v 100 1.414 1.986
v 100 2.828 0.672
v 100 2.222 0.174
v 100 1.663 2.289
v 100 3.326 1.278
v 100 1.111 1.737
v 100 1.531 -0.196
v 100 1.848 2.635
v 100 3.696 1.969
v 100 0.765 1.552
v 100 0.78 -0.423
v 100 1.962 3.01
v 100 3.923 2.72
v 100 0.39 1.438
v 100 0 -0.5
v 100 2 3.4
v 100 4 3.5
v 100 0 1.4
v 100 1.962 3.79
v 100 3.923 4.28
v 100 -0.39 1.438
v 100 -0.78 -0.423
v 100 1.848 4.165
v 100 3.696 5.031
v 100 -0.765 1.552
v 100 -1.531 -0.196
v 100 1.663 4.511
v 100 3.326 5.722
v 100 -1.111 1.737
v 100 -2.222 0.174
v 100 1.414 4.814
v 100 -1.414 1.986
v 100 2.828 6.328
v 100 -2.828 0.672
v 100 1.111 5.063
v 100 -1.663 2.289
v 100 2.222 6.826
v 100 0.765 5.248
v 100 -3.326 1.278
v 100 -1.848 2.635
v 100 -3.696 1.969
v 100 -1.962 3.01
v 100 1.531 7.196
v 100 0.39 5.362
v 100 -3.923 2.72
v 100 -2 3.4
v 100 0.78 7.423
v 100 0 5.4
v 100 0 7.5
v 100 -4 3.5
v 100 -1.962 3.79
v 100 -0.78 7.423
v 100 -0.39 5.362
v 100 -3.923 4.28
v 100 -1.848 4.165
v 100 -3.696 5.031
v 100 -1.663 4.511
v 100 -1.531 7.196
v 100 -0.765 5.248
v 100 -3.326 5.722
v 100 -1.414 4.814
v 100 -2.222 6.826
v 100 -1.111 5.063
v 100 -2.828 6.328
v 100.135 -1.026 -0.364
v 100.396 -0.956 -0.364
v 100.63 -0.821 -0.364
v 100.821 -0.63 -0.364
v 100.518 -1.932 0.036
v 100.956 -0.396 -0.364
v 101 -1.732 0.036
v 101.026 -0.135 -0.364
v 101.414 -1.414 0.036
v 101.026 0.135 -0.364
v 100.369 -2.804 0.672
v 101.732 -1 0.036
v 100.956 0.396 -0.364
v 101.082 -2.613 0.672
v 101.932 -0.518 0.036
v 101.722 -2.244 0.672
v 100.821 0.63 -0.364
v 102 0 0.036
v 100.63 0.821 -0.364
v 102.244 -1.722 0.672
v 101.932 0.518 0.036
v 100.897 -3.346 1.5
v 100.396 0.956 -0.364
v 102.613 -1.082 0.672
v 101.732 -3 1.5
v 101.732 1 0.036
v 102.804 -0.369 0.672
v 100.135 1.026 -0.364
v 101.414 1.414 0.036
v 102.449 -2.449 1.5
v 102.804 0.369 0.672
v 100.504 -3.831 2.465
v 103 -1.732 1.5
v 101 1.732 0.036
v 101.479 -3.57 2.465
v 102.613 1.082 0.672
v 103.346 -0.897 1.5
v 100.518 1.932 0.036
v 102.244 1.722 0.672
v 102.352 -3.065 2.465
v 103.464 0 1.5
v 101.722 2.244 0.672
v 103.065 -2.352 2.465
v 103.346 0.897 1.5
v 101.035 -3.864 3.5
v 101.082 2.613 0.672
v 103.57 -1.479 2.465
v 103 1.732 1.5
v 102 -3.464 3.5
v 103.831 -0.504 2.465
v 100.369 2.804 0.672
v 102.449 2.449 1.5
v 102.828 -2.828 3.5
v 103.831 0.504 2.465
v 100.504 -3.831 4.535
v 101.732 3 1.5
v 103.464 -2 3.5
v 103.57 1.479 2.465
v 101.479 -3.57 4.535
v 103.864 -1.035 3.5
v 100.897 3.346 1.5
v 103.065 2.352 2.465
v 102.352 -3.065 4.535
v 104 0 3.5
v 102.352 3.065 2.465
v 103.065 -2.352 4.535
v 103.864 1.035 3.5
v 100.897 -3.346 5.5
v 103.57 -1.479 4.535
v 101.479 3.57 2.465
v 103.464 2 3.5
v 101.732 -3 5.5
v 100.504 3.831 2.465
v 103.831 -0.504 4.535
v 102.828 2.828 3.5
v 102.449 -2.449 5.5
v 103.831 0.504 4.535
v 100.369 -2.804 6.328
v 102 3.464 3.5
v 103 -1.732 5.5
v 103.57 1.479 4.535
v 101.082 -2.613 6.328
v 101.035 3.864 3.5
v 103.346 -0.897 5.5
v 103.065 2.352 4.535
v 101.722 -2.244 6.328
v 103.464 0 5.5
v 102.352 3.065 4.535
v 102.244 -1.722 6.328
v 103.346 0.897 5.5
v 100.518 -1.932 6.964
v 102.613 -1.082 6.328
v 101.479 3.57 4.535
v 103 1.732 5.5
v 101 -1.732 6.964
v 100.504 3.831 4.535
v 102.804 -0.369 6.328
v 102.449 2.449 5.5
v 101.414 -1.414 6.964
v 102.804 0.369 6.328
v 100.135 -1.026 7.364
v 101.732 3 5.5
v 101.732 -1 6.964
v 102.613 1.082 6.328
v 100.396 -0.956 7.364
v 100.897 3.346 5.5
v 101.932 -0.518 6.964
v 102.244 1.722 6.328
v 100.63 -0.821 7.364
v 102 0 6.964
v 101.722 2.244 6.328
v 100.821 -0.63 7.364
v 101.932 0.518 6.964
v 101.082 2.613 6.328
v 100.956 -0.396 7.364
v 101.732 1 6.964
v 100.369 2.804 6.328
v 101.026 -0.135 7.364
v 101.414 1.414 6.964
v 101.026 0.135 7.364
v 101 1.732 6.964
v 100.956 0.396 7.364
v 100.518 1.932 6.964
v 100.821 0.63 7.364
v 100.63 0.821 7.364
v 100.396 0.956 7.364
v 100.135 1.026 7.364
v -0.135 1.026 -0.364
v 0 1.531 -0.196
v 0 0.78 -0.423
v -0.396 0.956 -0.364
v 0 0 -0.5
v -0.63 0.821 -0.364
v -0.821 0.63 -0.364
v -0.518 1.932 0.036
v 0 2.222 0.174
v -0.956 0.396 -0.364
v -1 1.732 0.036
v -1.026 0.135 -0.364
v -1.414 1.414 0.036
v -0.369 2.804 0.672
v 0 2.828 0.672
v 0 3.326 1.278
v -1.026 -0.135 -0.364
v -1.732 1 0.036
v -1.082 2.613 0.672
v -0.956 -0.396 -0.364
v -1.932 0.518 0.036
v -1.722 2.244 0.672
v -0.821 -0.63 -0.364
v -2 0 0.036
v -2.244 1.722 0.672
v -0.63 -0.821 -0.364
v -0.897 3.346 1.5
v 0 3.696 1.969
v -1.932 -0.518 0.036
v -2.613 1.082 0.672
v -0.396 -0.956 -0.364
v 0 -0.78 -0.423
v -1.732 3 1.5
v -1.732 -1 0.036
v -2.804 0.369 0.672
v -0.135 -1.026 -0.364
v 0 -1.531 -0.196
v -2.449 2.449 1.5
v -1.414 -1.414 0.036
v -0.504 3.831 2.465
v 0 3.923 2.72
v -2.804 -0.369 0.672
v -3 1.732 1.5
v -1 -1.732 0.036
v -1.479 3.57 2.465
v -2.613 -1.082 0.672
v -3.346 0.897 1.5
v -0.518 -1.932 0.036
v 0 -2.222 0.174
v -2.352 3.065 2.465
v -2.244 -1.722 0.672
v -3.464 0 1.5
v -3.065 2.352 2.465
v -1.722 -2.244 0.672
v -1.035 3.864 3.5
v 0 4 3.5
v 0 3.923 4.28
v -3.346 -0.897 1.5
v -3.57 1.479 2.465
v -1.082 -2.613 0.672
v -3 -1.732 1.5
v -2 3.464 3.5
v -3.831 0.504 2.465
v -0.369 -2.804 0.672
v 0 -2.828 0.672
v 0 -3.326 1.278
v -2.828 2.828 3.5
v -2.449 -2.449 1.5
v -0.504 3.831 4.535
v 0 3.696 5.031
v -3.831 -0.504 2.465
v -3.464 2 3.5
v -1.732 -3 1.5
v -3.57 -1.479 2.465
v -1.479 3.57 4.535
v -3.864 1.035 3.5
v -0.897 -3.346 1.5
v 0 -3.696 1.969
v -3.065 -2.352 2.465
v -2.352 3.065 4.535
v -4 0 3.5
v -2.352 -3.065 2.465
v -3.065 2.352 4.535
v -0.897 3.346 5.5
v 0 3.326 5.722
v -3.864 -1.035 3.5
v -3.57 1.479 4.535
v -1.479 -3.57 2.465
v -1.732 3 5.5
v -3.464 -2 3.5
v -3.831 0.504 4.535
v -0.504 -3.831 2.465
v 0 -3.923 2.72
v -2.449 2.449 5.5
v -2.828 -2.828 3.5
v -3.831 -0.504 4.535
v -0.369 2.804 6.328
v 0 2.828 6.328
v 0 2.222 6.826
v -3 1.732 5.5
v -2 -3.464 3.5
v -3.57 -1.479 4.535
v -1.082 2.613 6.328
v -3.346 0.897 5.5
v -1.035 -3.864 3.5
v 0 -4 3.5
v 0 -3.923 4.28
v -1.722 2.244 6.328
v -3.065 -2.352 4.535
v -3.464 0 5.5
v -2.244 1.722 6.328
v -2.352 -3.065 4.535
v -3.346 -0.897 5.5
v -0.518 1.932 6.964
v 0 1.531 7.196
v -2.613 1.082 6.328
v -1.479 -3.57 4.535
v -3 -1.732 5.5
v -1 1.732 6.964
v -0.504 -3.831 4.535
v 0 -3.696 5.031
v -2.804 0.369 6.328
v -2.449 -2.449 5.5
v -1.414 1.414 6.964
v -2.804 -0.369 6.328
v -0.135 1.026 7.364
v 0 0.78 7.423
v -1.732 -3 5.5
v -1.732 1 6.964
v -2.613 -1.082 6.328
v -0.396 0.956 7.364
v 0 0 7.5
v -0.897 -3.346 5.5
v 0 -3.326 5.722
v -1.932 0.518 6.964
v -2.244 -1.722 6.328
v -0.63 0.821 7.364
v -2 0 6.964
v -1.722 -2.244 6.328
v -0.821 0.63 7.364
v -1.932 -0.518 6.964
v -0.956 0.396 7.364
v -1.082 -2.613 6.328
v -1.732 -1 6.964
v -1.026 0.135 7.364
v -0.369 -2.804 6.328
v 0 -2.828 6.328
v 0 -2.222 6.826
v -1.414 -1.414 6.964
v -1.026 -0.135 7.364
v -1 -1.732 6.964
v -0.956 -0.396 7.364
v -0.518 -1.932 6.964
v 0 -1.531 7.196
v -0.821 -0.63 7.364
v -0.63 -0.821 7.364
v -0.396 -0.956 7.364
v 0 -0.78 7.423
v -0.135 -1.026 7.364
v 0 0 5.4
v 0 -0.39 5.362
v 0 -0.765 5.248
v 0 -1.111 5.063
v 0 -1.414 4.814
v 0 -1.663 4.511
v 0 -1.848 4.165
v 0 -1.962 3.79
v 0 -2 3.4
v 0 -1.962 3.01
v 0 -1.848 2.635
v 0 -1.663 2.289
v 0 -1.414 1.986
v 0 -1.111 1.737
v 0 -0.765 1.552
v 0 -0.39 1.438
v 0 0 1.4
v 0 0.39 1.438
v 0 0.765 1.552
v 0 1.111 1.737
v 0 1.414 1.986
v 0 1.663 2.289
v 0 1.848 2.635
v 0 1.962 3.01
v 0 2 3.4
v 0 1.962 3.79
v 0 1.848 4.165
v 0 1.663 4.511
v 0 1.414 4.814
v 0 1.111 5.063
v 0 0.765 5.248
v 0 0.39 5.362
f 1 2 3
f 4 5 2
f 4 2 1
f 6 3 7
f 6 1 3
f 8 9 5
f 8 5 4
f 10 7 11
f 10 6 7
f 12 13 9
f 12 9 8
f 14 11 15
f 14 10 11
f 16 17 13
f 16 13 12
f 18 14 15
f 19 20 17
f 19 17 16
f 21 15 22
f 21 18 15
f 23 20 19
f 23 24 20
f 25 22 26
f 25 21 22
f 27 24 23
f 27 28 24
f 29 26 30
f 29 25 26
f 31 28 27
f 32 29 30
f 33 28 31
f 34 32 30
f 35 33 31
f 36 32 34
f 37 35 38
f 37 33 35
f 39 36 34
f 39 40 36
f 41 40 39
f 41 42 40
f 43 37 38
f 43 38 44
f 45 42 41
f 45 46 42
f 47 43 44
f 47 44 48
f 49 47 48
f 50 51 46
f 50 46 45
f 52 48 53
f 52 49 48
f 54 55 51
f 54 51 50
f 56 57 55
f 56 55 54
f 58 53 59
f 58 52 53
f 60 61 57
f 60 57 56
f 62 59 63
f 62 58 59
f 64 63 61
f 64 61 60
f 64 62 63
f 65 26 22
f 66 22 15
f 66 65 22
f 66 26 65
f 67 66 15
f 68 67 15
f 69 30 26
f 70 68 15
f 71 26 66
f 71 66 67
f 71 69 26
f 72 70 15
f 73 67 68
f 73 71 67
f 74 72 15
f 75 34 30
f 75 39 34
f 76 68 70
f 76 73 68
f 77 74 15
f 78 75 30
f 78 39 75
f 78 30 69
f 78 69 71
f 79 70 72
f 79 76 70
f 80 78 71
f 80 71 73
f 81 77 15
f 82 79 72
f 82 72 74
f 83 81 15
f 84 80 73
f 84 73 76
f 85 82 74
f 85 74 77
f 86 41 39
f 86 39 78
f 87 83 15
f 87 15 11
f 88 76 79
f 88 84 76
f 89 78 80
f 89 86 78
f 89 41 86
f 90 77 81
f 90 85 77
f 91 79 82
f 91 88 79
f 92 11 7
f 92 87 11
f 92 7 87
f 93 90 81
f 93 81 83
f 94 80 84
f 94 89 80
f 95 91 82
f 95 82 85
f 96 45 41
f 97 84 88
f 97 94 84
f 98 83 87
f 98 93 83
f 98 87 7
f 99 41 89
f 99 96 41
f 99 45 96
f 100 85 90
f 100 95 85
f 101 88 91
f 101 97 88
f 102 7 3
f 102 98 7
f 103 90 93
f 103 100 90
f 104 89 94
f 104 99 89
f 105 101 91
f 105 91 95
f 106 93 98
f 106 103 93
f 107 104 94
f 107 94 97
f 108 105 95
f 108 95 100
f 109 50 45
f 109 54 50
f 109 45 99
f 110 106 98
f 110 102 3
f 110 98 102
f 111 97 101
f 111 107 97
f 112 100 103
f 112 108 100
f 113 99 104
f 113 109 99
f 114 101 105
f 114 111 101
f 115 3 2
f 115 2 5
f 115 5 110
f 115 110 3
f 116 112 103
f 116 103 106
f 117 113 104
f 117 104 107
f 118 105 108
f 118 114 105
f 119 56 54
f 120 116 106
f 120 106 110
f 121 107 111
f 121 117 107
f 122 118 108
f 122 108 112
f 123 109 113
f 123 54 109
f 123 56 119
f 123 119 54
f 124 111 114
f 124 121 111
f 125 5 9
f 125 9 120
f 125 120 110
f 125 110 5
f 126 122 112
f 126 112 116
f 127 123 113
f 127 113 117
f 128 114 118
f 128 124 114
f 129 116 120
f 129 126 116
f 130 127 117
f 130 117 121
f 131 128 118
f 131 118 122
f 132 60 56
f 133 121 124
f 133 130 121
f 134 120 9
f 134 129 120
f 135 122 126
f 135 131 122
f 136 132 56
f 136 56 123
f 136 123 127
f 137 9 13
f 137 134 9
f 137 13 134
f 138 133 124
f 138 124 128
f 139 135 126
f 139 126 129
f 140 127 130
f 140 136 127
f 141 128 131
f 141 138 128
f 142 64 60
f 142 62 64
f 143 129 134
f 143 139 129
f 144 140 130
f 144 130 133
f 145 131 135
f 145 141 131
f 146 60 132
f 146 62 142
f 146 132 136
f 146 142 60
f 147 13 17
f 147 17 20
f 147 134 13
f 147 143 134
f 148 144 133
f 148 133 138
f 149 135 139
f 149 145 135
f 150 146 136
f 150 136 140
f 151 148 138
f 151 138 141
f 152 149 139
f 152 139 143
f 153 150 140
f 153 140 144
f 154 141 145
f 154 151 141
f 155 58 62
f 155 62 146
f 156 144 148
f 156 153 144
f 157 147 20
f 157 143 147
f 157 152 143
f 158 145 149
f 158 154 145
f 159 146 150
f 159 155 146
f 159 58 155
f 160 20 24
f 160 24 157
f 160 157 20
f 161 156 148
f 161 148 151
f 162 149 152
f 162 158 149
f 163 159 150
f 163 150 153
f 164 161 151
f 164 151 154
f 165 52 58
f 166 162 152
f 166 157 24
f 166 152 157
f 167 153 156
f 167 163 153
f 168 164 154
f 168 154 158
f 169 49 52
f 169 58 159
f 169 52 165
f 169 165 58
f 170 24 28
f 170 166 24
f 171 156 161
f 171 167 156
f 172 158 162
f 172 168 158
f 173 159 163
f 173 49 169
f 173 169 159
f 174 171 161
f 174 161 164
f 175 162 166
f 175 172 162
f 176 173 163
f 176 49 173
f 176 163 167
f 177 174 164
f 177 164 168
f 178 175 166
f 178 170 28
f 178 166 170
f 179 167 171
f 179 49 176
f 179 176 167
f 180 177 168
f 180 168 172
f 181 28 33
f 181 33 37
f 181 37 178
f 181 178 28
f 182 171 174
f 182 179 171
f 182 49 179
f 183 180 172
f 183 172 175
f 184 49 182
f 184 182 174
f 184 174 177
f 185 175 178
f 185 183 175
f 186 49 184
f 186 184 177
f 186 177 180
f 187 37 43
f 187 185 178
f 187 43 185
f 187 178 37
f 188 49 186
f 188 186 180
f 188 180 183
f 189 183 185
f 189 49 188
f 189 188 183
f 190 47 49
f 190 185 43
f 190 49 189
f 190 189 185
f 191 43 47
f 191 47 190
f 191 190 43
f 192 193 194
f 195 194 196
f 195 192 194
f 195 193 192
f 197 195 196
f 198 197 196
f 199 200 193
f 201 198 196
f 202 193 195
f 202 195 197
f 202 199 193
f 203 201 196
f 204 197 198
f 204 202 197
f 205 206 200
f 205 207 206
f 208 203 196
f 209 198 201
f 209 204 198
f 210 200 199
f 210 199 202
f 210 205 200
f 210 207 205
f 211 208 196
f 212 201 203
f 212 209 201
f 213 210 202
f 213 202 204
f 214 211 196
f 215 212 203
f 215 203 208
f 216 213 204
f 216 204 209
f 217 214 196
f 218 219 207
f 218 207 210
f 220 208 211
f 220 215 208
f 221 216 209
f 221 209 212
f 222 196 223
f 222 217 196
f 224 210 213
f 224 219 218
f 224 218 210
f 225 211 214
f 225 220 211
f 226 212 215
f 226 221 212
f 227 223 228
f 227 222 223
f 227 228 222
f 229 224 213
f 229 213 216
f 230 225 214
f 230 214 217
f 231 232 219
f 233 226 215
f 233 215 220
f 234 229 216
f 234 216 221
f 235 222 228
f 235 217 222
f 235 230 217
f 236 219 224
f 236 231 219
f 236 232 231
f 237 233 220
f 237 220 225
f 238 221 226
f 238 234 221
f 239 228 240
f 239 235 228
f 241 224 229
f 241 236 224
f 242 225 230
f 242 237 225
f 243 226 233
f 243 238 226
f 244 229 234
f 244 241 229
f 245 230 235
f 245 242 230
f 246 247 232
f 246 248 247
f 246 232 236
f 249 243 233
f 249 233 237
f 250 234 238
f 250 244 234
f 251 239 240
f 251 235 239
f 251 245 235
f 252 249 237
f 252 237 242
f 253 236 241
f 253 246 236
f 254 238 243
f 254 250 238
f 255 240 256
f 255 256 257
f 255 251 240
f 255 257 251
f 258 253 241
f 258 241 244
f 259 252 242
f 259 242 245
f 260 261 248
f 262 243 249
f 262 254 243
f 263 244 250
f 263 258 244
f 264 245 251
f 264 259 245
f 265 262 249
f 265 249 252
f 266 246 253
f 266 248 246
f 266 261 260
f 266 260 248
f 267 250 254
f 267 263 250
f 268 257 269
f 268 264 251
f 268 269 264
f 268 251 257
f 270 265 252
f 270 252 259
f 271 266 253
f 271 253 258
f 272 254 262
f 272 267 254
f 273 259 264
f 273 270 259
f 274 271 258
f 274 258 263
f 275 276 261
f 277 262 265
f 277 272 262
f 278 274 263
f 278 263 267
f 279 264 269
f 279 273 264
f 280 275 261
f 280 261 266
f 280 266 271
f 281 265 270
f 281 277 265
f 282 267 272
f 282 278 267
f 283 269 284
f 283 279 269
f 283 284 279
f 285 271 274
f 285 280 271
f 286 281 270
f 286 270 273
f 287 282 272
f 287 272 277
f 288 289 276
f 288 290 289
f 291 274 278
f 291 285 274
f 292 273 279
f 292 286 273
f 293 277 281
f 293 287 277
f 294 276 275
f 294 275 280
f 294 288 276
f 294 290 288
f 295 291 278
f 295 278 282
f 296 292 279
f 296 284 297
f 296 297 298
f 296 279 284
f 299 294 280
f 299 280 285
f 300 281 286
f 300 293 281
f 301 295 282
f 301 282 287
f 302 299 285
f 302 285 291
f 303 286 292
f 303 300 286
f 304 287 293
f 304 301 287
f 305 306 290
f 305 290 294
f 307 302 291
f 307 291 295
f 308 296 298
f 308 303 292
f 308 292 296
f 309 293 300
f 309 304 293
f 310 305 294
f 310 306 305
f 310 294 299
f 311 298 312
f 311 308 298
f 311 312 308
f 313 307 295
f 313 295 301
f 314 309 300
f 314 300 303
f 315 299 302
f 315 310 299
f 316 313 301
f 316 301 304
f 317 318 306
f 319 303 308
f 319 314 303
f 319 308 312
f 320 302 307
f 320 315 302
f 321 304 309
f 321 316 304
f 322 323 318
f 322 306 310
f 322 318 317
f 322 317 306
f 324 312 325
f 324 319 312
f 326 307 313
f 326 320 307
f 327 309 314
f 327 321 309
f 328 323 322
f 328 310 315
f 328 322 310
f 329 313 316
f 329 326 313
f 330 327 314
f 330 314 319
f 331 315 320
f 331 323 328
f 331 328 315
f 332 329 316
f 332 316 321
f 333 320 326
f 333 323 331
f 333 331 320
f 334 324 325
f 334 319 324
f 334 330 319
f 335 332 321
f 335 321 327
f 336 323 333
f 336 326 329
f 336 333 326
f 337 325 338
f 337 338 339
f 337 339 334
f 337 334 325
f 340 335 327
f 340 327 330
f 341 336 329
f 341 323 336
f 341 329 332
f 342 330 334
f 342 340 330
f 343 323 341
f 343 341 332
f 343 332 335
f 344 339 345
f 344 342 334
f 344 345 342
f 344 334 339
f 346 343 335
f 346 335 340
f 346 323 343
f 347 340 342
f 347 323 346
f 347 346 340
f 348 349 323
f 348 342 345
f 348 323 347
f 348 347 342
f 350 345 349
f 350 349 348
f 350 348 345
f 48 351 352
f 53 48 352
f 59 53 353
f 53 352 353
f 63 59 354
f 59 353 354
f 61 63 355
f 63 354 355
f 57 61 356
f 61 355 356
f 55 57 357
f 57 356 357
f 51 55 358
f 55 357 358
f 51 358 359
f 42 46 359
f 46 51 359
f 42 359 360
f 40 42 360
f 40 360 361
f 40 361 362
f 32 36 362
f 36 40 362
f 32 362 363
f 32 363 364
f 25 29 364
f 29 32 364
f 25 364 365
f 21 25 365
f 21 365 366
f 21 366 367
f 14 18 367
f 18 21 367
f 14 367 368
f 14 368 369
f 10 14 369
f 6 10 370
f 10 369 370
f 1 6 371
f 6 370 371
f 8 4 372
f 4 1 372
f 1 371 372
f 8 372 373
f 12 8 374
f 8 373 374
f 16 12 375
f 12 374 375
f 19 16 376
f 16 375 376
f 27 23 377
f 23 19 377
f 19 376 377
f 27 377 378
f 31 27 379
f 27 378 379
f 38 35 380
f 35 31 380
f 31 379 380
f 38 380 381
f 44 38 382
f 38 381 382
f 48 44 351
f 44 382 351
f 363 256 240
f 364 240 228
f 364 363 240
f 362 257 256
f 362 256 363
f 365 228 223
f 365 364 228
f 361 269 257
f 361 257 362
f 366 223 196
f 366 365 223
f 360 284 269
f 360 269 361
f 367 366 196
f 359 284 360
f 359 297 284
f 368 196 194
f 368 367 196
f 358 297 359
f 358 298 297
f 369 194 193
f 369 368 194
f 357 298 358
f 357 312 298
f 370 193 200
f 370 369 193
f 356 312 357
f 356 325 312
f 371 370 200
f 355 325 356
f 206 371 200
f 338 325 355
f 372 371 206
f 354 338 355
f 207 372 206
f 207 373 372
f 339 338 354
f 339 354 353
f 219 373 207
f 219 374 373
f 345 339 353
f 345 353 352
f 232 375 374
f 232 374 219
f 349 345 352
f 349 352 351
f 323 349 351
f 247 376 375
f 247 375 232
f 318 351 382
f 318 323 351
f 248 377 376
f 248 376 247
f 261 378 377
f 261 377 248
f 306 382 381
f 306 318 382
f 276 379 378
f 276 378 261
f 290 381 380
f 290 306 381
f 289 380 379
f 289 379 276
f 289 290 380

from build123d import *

# Parameters (mm, degrees)
CYLINDER_R      = 2
CYLINDER_DEPTH  = 102
SPHERE_ANGLE    = 180
SPHERE001_ANGLE = 180


with BuildPart() as cylinder:
    # Cylinder → Cylinder (new body)
    with BuildSketch(Plane(origin=(-1, 50, 3.4), x_dir=(0, 0, 1), z_dir=(1, 0, 0))):
        Circle(CYLINDER_R)
    extrude(amount=CYLINDER_DEPTH)


with BuildPart() as sphere:
    # Sphere → Sphere (revolve)
    with BuildSketch(Plane(origin=(0, 50, 3.5), x_dir=(0, 1, 0), z_dir=(1, 0, 0))):
        with BuildLine():
            ThreePointArc((0, -4), (4, 0), (0, 4))
            Line((0, 4), (0, -4))
        make_face()
    revolve(axis=Axis((0, 50, 3.5), (0, 0, 1)), revolution_arc=SPHERE_ANGLE)


with BuildPart() as fusion:
    # Sphere001 → Sphere001 (revolve)
    with BuildSketch(Plane(origin=(100, 50, 3.5), x_dir=(0, -1, 0), z_dir=(-1, 0, 0))):
        with BuildLine():
            ThreePointArc((0, -4), (4, 0), (0, 4))
            Line((0, 4), (0, -4))
        make_face()
    revolve(axis=Axis((100, 50, 3.5), (0, 0, 1)), revolution_arc=SPHERE001_ANGLE)

    # Fusion: union Cylinder, Sphere
    add(cylinder.part)
    add(sphere.part)


with BuildPart() as fusion_1:
    # Fusion placement: moved
    add(fusion.part.moved(Location((0, -50, 0))))


solid = fusion_1.part
